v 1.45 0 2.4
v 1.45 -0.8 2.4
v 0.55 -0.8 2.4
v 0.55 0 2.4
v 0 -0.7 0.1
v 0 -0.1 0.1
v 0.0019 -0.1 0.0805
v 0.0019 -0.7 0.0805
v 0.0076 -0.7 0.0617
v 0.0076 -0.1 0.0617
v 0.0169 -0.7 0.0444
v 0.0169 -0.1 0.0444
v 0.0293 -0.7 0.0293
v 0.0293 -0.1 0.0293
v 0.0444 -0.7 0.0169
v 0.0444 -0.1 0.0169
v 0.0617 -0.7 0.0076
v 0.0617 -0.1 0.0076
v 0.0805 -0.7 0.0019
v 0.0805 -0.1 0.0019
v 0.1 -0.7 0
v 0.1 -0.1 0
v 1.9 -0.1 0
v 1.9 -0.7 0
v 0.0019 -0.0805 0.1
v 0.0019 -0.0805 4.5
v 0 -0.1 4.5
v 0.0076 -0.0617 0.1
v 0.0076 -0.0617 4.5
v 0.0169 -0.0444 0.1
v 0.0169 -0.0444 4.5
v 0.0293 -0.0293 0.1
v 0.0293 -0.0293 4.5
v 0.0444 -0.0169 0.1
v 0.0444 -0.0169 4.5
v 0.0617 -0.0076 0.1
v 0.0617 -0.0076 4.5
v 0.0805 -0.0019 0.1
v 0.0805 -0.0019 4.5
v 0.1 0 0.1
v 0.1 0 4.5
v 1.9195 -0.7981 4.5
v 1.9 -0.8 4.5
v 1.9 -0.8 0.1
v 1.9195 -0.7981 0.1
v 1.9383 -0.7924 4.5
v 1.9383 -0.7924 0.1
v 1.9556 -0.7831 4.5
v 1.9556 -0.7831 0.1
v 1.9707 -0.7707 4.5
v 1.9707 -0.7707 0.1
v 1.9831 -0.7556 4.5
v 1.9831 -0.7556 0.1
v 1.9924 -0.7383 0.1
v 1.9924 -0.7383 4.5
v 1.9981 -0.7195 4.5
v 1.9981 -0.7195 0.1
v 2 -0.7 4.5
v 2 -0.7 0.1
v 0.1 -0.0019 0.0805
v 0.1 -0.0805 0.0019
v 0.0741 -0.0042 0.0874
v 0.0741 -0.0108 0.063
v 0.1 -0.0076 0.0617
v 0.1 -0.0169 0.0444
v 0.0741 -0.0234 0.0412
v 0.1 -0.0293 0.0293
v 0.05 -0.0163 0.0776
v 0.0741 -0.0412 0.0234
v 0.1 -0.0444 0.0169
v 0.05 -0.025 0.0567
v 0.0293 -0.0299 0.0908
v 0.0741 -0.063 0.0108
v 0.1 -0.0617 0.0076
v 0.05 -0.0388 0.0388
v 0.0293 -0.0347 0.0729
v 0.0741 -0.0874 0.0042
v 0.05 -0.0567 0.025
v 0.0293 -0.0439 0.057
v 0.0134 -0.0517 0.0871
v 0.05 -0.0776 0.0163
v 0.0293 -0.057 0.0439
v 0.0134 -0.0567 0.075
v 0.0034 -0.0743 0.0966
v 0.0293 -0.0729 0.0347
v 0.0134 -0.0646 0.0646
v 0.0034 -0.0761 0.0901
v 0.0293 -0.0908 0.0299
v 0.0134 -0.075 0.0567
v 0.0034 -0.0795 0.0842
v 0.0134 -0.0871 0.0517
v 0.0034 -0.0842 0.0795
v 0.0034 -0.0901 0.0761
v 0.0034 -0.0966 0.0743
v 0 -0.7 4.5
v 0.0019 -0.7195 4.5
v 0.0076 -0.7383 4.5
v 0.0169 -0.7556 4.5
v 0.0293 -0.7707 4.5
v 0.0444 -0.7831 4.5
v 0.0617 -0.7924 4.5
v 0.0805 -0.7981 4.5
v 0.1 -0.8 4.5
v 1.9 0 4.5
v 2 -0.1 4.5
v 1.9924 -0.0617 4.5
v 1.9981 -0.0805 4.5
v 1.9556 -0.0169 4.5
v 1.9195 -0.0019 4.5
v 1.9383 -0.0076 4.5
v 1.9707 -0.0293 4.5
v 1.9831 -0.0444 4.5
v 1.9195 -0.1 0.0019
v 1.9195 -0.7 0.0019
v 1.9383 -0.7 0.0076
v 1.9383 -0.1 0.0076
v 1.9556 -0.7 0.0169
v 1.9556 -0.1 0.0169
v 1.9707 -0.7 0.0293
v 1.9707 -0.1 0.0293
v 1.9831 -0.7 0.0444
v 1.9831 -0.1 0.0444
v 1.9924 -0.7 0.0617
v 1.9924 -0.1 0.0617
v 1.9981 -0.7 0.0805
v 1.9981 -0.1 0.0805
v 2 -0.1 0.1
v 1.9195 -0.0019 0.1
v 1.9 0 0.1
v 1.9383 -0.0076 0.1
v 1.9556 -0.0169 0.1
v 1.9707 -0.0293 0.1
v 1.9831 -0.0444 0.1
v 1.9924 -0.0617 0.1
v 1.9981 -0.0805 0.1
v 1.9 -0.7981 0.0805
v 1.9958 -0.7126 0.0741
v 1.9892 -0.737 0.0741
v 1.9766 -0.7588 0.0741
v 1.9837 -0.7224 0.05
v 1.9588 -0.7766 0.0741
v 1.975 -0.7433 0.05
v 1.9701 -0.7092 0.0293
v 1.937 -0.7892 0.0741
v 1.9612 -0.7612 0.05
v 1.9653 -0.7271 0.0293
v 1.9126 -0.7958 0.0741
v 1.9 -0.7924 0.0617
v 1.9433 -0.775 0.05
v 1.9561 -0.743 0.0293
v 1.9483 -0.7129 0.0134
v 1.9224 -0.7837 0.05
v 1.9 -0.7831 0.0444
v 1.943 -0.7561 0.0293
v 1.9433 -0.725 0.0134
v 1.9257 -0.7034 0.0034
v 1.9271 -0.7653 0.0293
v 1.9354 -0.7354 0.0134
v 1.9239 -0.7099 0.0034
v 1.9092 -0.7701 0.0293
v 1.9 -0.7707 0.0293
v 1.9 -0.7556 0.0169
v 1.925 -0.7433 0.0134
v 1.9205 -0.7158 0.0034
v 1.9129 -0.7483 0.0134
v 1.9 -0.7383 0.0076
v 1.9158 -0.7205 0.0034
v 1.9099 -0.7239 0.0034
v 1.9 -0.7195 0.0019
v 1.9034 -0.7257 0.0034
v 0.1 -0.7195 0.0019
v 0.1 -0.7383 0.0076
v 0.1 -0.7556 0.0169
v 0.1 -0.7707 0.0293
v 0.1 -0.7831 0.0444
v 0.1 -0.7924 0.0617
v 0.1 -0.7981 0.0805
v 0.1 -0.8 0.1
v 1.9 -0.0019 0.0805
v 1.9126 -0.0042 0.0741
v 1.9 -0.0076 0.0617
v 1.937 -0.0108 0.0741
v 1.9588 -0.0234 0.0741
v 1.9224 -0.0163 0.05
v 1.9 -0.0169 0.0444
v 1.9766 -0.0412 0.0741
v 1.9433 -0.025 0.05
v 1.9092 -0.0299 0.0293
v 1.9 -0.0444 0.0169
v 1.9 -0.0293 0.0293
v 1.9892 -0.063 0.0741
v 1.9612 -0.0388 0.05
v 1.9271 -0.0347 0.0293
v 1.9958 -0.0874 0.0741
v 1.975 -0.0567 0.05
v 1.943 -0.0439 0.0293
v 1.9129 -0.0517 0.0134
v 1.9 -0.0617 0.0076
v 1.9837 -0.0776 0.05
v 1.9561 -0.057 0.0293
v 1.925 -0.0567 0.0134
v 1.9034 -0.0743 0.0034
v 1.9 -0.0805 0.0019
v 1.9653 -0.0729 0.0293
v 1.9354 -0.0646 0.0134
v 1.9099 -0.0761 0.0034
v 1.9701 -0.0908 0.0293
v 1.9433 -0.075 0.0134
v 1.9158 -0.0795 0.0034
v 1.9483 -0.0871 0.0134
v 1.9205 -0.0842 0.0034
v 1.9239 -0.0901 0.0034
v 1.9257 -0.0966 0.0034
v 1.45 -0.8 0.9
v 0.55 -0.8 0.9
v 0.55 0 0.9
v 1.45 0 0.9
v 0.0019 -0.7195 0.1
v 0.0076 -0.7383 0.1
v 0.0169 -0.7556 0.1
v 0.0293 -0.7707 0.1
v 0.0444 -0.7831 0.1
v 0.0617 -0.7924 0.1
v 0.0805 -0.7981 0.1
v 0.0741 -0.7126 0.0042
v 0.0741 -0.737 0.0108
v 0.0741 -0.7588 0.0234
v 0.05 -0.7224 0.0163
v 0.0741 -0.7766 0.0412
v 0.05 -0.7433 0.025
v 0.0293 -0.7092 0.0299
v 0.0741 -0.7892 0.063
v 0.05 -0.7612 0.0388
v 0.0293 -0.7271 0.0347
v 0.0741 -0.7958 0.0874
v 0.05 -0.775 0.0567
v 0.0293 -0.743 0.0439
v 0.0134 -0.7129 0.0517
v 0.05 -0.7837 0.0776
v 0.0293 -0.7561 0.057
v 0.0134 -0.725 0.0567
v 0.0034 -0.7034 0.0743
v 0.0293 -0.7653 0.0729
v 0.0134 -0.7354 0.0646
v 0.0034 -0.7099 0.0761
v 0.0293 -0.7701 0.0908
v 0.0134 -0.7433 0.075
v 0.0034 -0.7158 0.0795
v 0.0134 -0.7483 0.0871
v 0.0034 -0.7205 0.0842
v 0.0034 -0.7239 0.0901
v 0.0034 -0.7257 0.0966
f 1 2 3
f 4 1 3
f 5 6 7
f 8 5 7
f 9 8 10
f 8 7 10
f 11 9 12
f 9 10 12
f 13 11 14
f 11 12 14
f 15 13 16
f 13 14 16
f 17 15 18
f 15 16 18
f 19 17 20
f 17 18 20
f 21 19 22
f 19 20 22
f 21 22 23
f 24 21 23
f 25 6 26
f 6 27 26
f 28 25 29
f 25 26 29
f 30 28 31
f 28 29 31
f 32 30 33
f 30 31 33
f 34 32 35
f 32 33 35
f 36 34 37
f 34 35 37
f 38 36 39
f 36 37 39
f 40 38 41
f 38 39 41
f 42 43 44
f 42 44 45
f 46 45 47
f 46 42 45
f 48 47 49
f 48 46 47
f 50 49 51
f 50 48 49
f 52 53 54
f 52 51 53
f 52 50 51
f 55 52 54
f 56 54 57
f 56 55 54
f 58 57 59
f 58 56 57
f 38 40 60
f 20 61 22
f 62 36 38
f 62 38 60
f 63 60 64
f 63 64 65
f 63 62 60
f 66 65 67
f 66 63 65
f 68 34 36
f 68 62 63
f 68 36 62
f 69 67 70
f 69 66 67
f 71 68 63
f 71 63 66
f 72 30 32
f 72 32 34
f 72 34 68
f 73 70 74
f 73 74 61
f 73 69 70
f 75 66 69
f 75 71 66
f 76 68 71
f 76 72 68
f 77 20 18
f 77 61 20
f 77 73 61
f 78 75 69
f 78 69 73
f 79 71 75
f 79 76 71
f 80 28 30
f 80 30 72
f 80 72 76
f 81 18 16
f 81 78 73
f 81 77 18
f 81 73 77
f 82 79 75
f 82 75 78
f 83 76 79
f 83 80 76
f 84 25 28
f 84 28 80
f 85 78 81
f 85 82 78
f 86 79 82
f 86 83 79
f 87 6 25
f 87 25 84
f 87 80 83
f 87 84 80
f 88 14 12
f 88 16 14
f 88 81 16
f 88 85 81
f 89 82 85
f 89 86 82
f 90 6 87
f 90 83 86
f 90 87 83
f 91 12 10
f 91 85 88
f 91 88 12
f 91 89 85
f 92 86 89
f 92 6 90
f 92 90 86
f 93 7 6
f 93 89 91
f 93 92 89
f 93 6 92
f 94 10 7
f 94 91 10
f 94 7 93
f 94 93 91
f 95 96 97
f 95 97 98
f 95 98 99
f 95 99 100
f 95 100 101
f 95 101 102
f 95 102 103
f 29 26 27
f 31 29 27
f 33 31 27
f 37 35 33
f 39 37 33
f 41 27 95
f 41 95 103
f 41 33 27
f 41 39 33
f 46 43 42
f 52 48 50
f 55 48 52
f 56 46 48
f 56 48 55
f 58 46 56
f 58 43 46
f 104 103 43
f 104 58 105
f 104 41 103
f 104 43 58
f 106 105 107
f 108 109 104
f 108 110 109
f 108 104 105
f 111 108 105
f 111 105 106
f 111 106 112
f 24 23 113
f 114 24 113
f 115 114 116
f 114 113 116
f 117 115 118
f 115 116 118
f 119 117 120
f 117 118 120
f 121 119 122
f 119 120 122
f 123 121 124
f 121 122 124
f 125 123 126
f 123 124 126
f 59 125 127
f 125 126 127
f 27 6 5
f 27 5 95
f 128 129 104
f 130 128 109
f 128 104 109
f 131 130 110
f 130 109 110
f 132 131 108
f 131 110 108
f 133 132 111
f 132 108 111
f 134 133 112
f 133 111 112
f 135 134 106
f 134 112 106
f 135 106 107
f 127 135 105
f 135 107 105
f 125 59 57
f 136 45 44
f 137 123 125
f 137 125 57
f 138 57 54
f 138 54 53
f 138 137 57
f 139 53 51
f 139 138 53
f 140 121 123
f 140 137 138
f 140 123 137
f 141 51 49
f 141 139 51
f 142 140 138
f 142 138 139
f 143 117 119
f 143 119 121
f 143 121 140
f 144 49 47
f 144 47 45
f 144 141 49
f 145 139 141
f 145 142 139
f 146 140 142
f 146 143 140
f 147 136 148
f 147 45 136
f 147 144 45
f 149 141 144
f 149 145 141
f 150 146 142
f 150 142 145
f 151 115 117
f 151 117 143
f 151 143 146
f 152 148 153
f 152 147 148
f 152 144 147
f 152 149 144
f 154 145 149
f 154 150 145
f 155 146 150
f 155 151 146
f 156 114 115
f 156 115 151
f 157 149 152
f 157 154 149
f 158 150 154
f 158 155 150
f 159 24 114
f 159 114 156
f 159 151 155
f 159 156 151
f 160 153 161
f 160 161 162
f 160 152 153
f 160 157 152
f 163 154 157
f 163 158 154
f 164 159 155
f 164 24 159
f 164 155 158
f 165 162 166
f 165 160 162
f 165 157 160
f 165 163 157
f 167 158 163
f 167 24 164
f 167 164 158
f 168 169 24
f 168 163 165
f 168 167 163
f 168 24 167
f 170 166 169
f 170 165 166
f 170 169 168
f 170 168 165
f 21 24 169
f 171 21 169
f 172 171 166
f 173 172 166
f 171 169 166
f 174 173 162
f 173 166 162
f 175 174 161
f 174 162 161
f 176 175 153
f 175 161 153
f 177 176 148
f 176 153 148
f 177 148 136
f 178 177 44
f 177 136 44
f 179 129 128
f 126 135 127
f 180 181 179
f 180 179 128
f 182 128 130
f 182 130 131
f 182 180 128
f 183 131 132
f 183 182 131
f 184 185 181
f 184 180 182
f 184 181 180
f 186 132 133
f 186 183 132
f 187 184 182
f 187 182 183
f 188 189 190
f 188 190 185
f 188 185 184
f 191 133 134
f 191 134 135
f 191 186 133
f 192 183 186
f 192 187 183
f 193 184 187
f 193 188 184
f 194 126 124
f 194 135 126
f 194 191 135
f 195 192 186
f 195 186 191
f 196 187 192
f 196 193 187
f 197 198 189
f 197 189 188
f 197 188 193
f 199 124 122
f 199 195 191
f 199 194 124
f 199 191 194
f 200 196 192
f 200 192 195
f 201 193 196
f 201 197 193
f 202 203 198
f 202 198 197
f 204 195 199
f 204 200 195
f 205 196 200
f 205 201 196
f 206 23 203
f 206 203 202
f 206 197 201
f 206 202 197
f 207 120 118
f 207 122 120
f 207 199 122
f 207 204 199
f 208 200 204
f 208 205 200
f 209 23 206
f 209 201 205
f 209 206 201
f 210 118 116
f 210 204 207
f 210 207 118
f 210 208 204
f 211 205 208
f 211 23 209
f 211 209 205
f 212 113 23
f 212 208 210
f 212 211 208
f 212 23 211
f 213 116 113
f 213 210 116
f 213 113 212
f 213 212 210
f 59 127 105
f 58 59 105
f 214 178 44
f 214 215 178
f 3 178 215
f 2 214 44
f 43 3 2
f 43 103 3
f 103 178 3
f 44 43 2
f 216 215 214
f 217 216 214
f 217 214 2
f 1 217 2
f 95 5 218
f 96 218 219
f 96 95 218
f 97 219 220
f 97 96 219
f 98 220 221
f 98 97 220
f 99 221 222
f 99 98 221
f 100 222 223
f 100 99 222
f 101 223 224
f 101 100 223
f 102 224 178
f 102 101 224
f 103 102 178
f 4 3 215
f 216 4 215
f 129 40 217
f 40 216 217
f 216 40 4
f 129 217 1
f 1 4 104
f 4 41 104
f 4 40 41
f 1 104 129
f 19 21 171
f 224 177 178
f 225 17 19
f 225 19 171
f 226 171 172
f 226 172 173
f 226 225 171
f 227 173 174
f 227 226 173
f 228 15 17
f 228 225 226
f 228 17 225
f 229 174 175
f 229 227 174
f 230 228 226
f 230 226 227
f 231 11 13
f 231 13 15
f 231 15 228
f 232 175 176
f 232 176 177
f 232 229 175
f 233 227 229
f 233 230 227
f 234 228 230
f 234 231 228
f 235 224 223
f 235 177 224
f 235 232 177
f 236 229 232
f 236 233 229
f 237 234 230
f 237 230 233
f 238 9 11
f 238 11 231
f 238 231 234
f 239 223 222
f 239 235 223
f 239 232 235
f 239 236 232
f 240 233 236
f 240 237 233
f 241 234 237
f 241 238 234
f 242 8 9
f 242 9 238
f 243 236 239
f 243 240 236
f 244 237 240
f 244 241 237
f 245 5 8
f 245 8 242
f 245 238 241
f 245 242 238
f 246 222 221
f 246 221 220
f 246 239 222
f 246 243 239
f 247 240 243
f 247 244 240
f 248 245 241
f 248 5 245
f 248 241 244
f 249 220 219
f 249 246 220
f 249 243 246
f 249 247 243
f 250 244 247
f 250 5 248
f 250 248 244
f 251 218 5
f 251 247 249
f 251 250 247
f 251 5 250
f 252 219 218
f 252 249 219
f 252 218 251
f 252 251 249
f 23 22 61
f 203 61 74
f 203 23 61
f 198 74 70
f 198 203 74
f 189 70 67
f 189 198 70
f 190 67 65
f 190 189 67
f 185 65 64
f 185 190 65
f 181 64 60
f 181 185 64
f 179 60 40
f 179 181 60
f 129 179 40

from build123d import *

# Parameters (mm, degrees)
F0_W         = 2
F0_H         = 4.5
F1_DEPTH     = 0.8
F3_DEPTH     = 25.4
F4_R         = 0.1
F5_T1_DEPTH  = 0.6
F5_S5_W      = 0.1
F5_S5_H      = 0.1
F5_T6_DEPTH  = 0.1
F5_S11_W     = 0.1
F5_S11_H     = 0.1
F5_T12_DEPTH = 0.1
F5_S17_W     = 0.1
F5_S17_H     = 0.1
F5_T18_DEPTH = 0.1
F5_S23_W     = 0.1
F5_S23_H     = 0.1
F5_T24_DEPTH = 0.1


# Not quite as in the source:
# - a fillet or chamfer that OpenCascade refuses, or shapes differently, is made with other operations: its cross-section is extruded or revolved along the edge and cut away or added


with BuildPart() as f1:
    # F0 (on Front) → F1 (new body)
    with BuildSketch(Plane.XZ):
        with Locations((1, 2.25)):
            Rectangle(F0_W, F0_H)
    extrude(amount=F1_DEPTH)

    # F2 (on face) → F3 (cut)
    with BuildSketch(Plane.XZ.offset(0.8)):
        Polygon((0.55, 0.9), (1, 0.9), (1.45, 0.9), (1.45, 2.4), (0.55, 2.4), align=None)
    extrude(amount=-F3_DEPTH, mode=Mode.SUBTRACT)

    # F4
    f4_edges = [f1.edges().sort_by_distance(p)[0] for p in [
        (2, -0.8, 2.25),
        (1, -0.8, 0),
        (0, -0.8, 2.25),
        (2, 0, 2.25),
        (1, 0, 0),
        (0, 0, 2.25),
    ]]
    fillet(f4_edges, radius=F4_R)

    # F5: fillet of radius 0.1 on 2 edges, made by hand

    # F5_s2 → F5_t1 (cut)
    with BuildSketch(Plane.XZ.offset(0.1)):
        with BuildLine():
            ThreePointArc((0, 0.1), (0.0292893219, 0.0292893219), (0.1, 0))
            Line((0.1, 0), (0, 0))
            Line((0, 0), (0, 0.1))
        make_face()
        with BuildLine():
            ThreePointArc((1.9, 0), (1.9707106781, 0.0292893219), (2, 0.1))
            Line((2, 0.1), (2, 0))
            Line((2, 0), (1.9, 0))
        make_face()
    extrude(amount=F5_T1_DEPTH, mode=Mode.SUBTRACT)


with BuildPart() as f5_tool4:
    # F5_s5 → F5_t6 (new body)
    with BuildSketch(Plane.XY.offset(0.1)):
        with Locations((1.95, -0.05)):
            Rectangle(F5_S5_W, F5_S5_H)
    extrude(amount=-F5_T6_DEPTH)

    # F5_s7 → F5_t8 (revolve, cut)
    with BuildSketch(Plane(origin=(1.9, -0.1, 0.1), x_dir=(-0.7071067812, -0.7071067812, 0), z_dir=(0.7071067812, -0.7071067812, 0))):
        with BuildLine():
            ThreePointArc((0, -0.1), (0.1, 0), (0, 0.1))
            Line((0, 0.1), (0, -0.1))
        make_face()
    revolve(axis=Axis((1.9, -0.1, 0.1), (0, 0, -1)), mode=Mode.SUBTRACT)


with BuildPart() as f1_1:
    add(f1.part)

    # F5_t3: cut F5_tool4
    add(f5_tool4.part, mode=Mode.SUBTRACT)


with BuildPart() as f5_tool10:
    # F5_s11 → F5_t12 (new body)
    with BuildSketch(Plane.XY.offset(0.1)):
        with Locations((1.95, -0.75)):
            Rectangle(F5_S11_W, F5_S11_H)
    extrude(amount=-F5_T12_DEPTH)

    # F5_s13 → F5_t14 (revolve, cut)
    with BuildSketch(Plane(origin=(1.9, -0.7, 0.1), x_dir=(-0.7071067812, 0.7071067812, 0), z_dir=(-0.7071067812, -0.7071067812, 0))):
        with BuildLine():
            ThreePointArc((0, -0.1), (0.1, 0), (0, 0.1))
            Line((0, 0.1), (0, -0.1))
        make_face()
    revolve(axis=Axis((1.9, -0.7, 0.1), (0, 0, -1)), mode=Mode.SUBTRACT)


with BuildPart() as f1_2:
    add(f1_1.part)

    # F5_t9: cut F5_tool10
    add(f5_tool10.part, mode=Mode.SUBTRACT)


with BuildPart() as f5_tool16:
    # F5_s17 → F5_t18 (new body)
    with BuildSketch(Plane.YZ.offset(0.1)):
        with Locations((-0.05, 0.05)):
            Rectangle(F5_S17_W, F5_S17_H)
    extrude(amount=-F5_T18_DEPTH)

    # F5_s19 → F5_t20 (revolve, cut)
    with BuildSketch(Plane(origin=(0.1, -0.1, 0.1), x_dir=(0, -0.7071067812, 0.7071067812), z_dir=(0, -0.7071067812, -0.7071067812))):
        with BuildLine():
            ThreePointArc((0, -0.1), (0.1, 0), (0, 0.1))
            Line((0, 0.1), (0, -0.1))
        make_face()
    revolve(axis=Axis((0.1, -0.1, 0.1), (-1, 0, 0)), mode=Mode.SUBTRACT)


with BuildPart() as f1_3:
    add(f1_2.part)

    # F5_t15: cut F5_tool16
    add(f5_tool16.part, mode=Mode.SUBTRACT)


with BuildPart() as f5_tool22:
    # F5_s23 → F5_t24 (new body)
    with BuildSketch(Plane.YZ.offset(0.1)):
        with Locations((-0.75, 0.05)):
            Rectangle(F5_S23_W, F5_S23_H)
    extrude(amount=-F5_T24_DEPTH)

    # F5_s25 → F5_t26 (revolve, cut)
    with BuildSketch(Plane(origin=(0.1, -0.7, 0.1), x_dir=(0, 0.7071067812, 0.7071067812), z_dir=(0, -0.7071067812, 0.7071067812))):
        with BuildLine():
            ThreePointArc((0, -0.1), (0.1, 0), (0, 0.1))
            Line((0, 0.1), (0, -0.1))
        make_face()
    revolve(axis=Axis((0.1, -0.7, 0.1), (-1, 0, 0)), mode=Mode.SUBTRACT)


with BuildPart() as f1_4:
    add(f1_3.part)

    # F5_t21: cut F5_tool22
    add(f5_tool22.part, mode=Mode.SUBTRACT)


solid = f1_4.part
